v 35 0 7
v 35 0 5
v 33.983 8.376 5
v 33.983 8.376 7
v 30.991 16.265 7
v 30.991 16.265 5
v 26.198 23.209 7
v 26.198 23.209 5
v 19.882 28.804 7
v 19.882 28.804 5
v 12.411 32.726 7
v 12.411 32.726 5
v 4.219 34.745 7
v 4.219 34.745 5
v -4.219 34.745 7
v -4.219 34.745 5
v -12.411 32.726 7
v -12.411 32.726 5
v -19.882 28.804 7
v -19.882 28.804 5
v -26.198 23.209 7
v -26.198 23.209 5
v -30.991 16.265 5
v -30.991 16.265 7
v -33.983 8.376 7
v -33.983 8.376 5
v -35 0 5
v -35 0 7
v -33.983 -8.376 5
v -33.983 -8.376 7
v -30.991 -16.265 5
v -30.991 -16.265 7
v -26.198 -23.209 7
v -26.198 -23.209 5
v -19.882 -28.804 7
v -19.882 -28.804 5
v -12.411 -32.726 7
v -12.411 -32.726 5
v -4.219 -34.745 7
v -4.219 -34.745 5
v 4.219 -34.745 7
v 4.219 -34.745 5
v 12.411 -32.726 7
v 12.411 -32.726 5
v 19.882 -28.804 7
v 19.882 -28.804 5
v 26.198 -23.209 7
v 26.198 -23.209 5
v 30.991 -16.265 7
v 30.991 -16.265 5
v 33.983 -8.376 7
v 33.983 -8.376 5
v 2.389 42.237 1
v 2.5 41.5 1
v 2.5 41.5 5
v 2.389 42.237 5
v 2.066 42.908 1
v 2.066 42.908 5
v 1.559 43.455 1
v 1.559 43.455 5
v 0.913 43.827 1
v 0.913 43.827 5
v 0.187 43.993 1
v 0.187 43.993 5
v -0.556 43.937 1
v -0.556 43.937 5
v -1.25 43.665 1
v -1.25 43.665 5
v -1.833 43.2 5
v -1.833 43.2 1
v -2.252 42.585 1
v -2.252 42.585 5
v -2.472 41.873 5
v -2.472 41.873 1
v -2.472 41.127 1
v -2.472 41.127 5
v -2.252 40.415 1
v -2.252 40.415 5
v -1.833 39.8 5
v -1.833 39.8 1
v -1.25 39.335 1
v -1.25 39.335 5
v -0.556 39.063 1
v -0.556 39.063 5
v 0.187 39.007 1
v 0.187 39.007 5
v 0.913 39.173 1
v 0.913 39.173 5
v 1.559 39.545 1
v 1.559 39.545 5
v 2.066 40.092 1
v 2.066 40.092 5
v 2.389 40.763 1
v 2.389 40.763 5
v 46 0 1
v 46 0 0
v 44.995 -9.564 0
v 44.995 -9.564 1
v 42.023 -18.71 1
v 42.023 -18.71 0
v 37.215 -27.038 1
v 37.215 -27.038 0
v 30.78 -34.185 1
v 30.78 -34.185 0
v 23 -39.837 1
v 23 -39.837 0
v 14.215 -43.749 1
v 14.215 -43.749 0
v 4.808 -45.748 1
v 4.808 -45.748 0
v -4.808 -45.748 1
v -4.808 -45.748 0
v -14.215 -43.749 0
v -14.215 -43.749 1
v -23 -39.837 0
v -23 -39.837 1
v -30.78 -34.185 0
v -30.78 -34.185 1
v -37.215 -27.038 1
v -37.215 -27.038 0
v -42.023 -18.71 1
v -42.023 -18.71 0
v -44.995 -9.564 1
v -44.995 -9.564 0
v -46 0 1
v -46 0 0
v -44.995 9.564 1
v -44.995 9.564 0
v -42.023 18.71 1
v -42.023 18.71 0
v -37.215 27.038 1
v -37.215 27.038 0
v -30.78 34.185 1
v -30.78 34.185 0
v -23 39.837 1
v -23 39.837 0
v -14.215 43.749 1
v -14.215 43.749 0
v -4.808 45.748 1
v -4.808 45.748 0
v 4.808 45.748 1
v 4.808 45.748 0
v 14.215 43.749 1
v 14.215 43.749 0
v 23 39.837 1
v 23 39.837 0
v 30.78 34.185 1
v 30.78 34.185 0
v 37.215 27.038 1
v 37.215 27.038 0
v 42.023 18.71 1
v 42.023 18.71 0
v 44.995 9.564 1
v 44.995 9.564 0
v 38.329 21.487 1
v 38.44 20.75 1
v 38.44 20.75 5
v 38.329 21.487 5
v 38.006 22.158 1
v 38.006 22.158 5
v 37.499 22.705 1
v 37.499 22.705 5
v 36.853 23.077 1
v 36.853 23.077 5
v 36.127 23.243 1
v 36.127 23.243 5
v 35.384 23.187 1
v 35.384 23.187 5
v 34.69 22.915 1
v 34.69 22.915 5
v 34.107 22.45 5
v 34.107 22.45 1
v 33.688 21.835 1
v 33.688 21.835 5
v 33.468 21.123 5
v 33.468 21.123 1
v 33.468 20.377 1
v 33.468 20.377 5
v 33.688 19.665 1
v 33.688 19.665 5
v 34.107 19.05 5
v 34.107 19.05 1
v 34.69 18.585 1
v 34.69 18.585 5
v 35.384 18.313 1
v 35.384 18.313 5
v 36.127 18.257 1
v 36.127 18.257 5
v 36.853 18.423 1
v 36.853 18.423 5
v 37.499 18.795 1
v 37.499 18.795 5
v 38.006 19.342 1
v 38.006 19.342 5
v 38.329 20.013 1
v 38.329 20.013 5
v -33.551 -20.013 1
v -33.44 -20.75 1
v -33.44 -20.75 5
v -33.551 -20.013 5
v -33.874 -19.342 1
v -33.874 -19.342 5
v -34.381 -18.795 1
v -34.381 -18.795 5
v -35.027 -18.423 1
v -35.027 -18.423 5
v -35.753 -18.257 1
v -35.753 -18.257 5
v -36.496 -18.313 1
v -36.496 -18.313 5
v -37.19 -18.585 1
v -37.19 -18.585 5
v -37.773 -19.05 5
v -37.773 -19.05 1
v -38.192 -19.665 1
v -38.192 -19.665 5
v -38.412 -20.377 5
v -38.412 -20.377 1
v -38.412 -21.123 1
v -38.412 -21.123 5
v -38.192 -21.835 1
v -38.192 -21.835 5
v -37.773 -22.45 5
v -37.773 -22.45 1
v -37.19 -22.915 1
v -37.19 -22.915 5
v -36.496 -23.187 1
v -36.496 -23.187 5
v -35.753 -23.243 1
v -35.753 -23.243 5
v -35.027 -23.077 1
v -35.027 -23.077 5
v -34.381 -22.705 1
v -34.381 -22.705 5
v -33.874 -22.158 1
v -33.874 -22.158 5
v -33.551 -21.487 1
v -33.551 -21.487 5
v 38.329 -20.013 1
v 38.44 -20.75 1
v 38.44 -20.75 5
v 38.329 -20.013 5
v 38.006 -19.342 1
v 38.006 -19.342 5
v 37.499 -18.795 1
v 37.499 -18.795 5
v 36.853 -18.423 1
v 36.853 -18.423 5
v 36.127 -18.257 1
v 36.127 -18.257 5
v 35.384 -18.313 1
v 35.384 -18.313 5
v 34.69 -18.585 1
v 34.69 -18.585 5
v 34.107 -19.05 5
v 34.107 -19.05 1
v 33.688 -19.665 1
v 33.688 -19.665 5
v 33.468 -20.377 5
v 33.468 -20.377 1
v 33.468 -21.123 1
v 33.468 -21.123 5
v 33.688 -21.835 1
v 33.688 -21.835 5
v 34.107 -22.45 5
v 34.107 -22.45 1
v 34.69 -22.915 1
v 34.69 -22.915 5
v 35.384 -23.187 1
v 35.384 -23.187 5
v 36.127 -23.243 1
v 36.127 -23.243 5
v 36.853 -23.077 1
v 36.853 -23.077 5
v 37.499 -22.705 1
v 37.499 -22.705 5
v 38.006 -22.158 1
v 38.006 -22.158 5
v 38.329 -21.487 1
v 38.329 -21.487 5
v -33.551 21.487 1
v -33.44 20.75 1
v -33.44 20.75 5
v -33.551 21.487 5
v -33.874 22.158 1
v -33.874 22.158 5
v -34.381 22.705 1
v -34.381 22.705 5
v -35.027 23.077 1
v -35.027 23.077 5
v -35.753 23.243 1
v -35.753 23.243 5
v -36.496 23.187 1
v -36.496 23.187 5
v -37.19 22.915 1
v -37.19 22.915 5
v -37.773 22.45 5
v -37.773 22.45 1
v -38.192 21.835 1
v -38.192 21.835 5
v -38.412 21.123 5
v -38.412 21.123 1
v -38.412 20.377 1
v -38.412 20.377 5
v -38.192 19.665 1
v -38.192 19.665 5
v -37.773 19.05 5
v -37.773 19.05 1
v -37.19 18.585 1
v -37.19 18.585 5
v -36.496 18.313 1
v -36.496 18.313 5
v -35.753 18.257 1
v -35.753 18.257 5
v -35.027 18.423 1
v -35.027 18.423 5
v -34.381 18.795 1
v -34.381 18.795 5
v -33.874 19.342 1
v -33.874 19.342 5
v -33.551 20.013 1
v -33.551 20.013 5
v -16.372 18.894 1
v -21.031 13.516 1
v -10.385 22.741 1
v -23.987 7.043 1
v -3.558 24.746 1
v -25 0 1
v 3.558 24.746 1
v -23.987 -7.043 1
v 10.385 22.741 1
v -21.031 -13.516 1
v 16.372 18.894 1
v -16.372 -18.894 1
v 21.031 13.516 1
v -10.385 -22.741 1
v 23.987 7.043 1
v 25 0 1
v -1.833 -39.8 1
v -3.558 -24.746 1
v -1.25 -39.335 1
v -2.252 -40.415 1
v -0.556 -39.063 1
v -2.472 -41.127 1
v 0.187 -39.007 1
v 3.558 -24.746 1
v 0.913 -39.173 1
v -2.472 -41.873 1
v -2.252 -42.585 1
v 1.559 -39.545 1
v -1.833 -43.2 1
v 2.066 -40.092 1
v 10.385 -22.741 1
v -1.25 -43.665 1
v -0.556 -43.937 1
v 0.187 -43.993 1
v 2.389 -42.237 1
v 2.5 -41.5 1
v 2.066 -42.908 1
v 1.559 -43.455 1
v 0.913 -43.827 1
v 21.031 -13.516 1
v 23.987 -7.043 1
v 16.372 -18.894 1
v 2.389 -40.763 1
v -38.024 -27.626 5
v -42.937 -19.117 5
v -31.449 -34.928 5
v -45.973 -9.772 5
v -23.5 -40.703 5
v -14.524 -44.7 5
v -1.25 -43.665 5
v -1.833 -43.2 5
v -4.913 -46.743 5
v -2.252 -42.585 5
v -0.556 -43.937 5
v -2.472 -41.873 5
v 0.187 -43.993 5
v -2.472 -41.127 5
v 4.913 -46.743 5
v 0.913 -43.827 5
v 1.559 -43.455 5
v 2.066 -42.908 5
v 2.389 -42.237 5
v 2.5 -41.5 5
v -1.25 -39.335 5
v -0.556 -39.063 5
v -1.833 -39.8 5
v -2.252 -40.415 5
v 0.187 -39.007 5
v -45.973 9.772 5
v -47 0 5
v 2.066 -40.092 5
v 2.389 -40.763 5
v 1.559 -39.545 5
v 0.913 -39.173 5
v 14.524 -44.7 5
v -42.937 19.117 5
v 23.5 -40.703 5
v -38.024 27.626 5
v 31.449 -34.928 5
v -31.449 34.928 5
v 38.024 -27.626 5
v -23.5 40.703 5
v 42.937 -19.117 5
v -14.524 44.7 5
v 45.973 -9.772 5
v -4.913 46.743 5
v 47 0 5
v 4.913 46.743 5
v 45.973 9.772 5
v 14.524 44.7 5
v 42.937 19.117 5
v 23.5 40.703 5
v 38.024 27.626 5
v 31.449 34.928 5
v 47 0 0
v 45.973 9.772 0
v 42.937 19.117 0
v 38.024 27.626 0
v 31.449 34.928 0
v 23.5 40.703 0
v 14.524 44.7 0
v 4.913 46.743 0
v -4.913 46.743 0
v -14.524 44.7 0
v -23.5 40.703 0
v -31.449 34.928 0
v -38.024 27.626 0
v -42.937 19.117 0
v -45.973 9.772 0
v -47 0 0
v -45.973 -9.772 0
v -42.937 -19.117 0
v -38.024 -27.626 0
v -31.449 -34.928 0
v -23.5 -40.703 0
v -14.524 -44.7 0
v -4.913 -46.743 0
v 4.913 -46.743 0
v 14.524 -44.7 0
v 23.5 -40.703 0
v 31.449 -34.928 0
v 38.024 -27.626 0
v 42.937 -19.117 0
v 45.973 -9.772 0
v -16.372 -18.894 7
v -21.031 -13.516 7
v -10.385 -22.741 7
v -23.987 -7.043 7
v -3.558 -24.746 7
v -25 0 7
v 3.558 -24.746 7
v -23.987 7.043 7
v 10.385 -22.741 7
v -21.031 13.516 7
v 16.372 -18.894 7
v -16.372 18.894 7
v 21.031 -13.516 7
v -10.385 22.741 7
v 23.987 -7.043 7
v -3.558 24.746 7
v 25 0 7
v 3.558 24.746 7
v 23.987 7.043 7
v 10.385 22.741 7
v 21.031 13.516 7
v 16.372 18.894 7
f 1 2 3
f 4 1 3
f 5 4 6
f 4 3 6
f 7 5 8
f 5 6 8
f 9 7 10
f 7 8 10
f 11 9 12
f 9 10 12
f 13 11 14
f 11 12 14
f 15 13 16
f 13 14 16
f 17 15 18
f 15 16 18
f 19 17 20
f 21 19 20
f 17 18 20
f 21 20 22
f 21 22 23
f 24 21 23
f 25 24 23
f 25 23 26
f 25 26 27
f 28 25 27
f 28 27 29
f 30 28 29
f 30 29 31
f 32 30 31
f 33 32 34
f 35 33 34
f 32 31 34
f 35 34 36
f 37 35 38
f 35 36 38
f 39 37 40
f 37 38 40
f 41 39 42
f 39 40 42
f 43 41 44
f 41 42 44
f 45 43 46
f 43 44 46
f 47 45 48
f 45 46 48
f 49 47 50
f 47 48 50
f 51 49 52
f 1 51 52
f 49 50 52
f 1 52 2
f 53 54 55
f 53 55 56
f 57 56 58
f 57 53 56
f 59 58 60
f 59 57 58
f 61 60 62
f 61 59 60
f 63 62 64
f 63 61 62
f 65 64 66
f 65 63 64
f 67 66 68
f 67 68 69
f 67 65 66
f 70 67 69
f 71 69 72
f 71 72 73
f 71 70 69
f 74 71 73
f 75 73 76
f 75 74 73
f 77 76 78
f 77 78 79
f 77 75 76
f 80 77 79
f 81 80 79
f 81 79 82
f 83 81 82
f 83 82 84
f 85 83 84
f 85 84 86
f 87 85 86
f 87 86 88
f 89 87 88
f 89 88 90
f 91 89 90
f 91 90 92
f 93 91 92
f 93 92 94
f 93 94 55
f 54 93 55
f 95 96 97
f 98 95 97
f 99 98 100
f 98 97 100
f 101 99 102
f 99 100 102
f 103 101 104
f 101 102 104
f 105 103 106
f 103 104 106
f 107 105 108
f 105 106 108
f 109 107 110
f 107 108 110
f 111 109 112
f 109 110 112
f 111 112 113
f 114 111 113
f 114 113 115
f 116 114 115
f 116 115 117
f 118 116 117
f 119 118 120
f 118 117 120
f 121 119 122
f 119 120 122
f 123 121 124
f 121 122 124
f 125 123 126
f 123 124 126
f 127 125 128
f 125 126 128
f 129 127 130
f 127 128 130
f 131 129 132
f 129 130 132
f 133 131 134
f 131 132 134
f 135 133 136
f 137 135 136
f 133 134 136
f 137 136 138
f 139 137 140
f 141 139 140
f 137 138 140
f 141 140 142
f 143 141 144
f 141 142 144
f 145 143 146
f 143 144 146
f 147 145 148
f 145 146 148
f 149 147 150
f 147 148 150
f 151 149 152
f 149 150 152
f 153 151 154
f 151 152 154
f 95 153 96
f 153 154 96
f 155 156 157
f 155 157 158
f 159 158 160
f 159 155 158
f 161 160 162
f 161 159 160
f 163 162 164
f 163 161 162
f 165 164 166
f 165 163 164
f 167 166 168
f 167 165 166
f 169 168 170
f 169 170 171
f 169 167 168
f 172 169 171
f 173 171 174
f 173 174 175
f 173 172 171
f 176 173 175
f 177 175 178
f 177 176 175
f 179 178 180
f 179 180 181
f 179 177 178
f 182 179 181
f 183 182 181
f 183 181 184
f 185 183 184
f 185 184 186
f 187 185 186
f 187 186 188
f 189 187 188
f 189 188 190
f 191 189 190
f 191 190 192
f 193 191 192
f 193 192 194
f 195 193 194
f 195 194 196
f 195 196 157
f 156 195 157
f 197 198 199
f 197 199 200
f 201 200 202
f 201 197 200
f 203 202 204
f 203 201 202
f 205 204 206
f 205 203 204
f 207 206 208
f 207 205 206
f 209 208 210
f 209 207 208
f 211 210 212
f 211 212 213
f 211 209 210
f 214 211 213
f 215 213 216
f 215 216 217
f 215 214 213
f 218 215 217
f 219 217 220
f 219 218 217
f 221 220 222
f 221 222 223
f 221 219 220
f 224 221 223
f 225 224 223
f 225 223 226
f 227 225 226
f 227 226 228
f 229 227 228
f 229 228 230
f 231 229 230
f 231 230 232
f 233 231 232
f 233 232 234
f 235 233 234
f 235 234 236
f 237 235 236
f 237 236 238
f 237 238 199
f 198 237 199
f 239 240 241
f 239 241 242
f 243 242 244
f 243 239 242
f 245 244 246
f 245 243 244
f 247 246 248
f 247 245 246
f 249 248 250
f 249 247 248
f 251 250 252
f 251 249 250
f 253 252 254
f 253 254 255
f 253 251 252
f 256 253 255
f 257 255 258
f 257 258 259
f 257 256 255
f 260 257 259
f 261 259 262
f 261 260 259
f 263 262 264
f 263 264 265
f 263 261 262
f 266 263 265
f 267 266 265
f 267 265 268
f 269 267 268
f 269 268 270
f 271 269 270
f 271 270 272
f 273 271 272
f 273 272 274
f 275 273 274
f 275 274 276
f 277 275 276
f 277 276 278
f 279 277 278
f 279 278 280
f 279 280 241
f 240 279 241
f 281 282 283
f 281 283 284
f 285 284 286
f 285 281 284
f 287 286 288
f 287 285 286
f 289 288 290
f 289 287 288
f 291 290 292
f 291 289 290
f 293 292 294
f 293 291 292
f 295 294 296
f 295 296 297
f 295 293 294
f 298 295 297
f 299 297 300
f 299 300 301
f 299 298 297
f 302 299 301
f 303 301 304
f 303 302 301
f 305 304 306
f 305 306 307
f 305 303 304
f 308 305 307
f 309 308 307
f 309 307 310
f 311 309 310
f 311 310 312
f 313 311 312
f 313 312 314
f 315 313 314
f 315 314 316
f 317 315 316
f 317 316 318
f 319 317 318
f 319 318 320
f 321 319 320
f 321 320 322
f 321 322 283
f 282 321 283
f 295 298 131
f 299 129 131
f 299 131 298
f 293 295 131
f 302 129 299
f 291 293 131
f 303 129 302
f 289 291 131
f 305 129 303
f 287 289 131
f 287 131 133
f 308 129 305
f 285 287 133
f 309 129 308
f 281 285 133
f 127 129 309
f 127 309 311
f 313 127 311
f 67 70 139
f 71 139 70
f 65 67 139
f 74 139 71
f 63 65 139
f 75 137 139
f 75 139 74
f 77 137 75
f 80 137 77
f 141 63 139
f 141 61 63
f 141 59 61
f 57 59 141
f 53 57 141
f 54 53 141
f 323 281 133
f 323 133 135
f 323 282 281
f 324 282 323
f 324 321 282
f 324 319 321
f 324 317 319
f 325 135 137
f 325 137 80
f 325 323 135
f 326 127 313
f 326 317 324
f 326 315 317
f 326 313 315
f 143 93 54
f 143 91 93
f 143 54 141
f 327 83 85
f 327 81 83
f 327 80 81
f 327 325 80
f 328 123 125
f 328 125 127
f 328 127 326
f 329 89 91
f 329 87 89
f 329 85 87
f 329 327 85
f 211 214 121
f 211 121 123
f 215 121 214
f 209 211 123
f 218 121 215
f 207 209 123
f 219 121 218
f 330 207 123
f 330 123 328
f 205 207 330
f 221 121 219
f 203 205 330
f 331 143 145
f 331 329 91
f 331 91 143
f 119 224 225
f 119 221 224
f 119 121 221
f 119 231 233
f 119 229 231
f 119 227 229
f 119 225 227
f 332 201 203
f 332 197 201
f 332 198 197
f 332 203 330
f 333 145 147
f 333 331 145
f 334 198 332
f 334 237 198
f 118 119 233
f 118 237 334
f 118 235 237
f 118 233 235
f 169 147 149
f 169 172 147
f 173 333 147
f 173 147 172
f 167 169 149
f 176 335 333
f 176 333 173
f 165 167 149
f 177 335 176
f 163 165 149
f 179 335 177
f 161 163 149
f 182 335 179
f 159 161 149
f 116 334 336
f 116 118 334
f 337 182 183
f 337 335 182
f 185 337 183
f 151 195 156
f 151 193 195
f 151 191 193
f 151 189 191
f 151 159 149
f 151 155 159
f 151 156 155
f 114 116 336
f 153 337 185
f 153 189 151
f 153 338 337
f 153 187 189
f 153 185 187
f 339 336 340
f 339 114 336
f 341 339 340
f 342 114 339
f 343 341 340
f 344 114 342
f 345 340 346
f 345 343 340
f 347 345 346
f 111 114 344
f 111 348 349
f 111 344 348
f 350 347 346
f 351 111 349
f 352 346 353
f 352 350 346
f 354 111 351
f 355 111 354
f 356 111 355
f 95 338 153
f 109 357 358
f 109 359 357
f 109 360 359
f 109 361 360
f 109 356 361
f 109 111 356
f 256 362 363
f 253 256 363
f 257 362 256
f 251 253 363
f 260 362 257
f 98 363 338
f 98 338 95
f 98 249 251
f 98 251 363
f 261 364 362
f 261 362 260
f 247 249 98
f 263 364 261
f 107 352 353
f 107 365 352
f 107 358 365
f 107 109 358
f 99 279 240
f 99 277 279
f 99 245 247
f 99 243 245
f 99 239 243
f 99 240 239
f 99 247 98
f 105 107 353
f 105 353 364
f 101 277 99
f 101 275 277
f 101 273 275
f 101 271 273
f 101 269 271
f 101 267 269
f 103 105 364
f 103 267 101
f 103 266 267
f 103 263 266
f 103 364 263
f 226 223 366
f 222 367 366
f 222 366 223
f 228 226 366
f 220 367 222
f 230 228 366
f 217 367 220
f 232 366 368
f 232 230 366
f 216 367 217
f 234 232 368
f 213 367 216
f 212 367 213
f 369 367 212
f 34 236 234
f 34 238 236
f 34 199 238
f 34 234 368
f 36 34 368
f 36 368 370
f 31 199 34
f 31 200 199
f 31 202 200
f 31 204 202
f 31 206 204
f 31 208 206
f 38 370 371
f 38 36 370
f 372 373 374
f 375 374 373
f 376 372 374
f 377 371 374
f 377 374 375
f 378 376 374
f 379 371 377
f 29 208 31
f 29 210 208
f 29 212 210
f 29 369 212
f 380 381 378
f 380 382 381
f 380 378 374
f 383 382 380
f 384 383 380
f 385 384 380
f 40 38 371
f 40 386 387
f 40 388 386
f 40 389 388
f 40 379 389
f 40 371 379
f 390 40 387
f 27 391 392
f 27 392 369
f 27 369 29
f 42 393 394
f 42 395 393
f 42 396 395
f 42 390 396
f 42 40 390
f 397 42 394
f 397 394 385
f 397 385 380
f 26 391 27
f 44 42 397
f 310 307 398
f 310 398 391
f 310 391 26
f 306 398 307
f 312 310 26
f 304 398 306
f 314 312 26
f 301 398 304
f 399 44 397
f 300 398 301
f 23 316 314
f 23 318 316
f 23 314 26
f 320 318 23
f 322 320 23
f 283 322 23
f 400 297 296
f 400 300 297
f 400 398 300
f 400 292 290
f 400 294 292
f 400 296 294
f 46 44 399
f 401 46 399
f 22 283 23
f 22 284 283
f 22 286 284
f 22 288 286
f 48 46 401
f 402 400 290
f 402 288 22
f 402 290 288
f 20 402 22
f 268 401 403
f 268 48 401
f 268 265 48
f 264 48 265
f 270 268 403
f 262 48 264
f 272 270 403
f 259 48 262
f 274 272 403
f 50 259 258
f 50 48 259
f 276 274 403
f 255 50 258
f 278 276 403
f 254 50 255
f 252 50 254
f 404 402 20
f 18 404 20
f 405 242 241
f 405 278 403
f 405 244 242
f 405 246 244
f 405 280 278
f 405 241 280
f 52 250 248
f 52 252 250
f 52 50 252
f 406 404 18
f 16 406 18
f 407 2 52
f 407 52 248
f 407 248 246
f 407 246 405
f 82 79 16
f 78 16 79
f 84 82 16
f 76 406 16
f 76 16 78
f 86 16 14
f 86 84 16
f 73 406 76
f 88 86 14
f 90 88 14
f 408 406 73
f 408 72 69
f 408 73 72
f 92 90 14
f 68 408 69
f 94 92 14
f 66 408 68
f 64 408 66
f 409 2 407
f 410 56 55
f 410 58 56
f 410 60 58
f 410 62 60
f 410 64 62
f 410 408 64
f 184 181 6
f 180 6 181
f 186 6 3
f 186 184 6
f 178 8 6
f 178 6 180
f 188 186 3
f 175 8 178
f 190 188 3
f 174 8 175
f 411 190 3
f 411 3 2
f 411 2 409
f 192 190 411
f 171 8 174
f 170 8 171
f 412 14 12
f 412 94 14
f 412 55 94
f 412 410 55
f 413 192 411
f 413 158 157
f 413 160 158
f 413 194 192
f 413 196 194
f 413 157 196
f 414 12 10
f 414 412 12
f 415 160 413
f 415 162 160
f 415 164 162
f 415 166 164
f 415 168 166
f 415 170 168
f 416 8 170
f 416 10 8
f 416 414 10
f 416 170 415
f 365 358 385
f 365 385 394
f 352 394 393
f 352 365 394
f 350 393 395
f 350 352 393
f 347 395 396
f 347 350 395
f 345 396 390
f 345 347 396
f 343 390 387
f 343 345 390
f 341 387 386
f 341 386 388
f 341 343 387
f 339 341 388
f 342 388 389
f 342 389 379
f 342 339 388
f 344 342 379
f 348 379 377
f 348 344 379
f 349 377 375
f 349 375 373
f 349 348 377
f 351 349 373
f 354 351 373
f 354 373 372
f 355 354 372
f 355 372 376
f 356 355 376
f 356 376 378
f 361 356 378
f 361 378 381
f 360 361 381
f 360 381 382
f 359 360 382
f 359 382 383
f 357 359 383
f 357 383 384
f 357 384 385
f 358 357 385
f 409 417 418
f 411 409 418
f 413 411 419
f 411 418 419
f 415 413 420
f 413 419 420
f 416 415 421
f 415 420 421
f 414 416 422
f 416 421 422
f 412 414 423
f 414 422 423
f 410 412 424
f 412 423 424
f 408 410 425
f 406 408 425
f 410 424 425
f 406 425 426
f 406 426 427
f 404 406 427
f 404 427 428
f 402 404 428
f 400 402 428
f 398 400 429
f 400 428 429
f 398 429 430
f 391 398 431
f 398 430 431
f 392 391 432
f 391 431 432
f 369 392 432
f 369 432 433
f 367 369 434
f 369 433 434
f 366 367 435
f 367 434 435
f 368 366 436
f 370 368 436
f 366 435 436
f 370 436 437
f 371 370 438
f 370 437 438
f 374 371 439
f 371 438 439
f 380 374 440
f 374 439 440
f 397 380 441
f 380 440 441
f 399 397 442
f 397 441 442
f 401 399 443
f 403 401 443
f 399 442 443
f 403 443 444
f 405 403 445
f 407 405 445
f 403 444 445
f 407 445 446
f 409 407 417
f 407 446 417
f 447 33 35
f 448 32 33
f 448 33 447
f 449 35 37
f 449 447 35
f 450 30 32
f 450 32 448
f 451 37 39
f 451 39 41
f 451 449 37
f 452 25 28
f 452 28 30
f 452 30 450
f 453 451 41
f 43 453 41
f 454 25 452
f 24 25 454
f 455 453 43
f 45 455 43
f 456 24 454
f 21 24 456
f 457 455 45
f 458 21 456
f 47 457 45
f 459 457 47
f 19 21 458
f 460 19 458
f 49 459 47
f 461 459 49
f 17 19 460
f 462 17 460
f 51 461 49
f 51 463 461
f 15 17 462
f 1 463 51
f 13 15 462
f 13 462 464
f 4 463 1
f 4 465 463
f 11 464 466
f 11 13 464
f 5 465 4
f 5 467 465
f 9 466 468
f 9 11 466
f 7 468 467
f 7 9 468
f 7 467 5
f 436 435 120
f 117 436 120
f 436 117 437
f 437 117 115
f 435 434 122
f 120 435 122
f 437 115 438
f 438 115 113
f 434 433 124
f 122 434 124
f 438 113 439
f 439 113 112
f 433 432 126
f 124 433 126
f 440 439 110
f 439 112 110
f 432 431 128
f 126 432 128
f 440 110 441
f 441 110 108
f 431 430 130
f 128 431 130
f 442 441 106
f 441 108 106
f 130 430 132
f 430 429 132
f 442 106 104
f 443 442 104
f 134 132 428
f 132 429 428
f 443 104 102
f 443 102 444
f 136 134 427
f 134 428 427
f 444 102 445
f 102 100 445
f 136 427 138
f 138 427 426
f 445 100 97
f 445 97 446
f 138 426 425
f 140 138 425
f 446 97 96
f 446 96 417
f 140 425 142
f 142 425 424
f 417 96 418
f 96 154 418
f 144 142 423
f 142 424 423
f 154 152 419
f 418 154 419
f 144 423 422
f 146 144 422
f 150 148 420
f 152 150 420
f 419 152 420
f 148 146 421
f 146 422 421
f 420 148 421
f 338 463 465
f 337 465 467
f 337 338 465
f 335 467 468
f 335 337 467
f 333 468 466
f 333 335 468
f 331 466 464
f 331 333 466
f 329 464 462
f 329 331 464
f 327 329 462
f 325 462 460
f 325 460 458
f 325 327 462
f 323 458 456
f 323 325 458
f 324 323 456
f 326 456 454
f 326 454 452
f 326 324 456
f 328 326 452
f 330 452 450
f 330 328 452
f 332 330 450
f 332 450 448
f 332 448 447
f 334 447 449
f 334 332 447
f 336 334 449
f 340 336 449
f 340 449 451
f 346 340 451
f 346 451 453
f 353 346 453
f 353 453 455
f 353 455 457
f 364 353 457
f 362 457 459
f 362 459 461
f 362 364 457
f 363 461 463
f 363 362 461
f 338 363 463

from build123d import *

# Parameters (mm, degrees)
F0_R     = 47
F0_R_2   = 2.5
F0_R_3   = 25
F1_DEPTH = 5
F2_R     = 35
F2_R_2   = 25
F3_DEPTH = 2
F4_R     = 46
F5_DEPTH = 1


with BuildPart() as f1:
    # F0 (on Top) → F1 (new body)
    with BuildSketch(Plane.XY):
        Circle(F0_R)
        with Locations((-35.940054, -20.75)):
            Circle(F0_R_2, mode=Mode.SUBTRACT)
        with Locations((0, -41.5)):
            Circle(F0_R_2, mode=Mode.SUBTRACT)
        with Locations((35.940054, -20.75)):
            Circle(F0_R_2, mode=Mode.SUBTRACT)
        with Locations((-35.940054, 20.75)):
            Circle(F0_R_2, mode=Mode.SUBTRACT)
        Circle(F0_R_3, mode=Mode.SUBTRACT)
        with Locations((35.940054, 20.75)):
            Circle(F0_R_2, mode=Mode.SUBTRACT)
        with Locations((0, 41.5)):
            Circle(F0_R_2, mode=Mode.SUBTRACT)
    extrude(amount=F1_DEPTH)

    # F2 (on face) → F3 (join)
    with BuildSketch(Plane.XY.offset(5)):
        Circle(F2_R)
        Circle(F2_R_2, mode=Mode.SUBTRACT)
    extrude(amount=F3_DEPTH)

    # F4 (on face) → F5 (cut)
    with BuildSketch(Plane(origin=(0, 0, 0), x_dir=(1, 0, 0), z_dir=(0, 0, -1))):
        Circle(F4_R)
    extrude(amount=-F5_DEPTH, mode=Mode.SUBTRACT)


solid = f1.part
